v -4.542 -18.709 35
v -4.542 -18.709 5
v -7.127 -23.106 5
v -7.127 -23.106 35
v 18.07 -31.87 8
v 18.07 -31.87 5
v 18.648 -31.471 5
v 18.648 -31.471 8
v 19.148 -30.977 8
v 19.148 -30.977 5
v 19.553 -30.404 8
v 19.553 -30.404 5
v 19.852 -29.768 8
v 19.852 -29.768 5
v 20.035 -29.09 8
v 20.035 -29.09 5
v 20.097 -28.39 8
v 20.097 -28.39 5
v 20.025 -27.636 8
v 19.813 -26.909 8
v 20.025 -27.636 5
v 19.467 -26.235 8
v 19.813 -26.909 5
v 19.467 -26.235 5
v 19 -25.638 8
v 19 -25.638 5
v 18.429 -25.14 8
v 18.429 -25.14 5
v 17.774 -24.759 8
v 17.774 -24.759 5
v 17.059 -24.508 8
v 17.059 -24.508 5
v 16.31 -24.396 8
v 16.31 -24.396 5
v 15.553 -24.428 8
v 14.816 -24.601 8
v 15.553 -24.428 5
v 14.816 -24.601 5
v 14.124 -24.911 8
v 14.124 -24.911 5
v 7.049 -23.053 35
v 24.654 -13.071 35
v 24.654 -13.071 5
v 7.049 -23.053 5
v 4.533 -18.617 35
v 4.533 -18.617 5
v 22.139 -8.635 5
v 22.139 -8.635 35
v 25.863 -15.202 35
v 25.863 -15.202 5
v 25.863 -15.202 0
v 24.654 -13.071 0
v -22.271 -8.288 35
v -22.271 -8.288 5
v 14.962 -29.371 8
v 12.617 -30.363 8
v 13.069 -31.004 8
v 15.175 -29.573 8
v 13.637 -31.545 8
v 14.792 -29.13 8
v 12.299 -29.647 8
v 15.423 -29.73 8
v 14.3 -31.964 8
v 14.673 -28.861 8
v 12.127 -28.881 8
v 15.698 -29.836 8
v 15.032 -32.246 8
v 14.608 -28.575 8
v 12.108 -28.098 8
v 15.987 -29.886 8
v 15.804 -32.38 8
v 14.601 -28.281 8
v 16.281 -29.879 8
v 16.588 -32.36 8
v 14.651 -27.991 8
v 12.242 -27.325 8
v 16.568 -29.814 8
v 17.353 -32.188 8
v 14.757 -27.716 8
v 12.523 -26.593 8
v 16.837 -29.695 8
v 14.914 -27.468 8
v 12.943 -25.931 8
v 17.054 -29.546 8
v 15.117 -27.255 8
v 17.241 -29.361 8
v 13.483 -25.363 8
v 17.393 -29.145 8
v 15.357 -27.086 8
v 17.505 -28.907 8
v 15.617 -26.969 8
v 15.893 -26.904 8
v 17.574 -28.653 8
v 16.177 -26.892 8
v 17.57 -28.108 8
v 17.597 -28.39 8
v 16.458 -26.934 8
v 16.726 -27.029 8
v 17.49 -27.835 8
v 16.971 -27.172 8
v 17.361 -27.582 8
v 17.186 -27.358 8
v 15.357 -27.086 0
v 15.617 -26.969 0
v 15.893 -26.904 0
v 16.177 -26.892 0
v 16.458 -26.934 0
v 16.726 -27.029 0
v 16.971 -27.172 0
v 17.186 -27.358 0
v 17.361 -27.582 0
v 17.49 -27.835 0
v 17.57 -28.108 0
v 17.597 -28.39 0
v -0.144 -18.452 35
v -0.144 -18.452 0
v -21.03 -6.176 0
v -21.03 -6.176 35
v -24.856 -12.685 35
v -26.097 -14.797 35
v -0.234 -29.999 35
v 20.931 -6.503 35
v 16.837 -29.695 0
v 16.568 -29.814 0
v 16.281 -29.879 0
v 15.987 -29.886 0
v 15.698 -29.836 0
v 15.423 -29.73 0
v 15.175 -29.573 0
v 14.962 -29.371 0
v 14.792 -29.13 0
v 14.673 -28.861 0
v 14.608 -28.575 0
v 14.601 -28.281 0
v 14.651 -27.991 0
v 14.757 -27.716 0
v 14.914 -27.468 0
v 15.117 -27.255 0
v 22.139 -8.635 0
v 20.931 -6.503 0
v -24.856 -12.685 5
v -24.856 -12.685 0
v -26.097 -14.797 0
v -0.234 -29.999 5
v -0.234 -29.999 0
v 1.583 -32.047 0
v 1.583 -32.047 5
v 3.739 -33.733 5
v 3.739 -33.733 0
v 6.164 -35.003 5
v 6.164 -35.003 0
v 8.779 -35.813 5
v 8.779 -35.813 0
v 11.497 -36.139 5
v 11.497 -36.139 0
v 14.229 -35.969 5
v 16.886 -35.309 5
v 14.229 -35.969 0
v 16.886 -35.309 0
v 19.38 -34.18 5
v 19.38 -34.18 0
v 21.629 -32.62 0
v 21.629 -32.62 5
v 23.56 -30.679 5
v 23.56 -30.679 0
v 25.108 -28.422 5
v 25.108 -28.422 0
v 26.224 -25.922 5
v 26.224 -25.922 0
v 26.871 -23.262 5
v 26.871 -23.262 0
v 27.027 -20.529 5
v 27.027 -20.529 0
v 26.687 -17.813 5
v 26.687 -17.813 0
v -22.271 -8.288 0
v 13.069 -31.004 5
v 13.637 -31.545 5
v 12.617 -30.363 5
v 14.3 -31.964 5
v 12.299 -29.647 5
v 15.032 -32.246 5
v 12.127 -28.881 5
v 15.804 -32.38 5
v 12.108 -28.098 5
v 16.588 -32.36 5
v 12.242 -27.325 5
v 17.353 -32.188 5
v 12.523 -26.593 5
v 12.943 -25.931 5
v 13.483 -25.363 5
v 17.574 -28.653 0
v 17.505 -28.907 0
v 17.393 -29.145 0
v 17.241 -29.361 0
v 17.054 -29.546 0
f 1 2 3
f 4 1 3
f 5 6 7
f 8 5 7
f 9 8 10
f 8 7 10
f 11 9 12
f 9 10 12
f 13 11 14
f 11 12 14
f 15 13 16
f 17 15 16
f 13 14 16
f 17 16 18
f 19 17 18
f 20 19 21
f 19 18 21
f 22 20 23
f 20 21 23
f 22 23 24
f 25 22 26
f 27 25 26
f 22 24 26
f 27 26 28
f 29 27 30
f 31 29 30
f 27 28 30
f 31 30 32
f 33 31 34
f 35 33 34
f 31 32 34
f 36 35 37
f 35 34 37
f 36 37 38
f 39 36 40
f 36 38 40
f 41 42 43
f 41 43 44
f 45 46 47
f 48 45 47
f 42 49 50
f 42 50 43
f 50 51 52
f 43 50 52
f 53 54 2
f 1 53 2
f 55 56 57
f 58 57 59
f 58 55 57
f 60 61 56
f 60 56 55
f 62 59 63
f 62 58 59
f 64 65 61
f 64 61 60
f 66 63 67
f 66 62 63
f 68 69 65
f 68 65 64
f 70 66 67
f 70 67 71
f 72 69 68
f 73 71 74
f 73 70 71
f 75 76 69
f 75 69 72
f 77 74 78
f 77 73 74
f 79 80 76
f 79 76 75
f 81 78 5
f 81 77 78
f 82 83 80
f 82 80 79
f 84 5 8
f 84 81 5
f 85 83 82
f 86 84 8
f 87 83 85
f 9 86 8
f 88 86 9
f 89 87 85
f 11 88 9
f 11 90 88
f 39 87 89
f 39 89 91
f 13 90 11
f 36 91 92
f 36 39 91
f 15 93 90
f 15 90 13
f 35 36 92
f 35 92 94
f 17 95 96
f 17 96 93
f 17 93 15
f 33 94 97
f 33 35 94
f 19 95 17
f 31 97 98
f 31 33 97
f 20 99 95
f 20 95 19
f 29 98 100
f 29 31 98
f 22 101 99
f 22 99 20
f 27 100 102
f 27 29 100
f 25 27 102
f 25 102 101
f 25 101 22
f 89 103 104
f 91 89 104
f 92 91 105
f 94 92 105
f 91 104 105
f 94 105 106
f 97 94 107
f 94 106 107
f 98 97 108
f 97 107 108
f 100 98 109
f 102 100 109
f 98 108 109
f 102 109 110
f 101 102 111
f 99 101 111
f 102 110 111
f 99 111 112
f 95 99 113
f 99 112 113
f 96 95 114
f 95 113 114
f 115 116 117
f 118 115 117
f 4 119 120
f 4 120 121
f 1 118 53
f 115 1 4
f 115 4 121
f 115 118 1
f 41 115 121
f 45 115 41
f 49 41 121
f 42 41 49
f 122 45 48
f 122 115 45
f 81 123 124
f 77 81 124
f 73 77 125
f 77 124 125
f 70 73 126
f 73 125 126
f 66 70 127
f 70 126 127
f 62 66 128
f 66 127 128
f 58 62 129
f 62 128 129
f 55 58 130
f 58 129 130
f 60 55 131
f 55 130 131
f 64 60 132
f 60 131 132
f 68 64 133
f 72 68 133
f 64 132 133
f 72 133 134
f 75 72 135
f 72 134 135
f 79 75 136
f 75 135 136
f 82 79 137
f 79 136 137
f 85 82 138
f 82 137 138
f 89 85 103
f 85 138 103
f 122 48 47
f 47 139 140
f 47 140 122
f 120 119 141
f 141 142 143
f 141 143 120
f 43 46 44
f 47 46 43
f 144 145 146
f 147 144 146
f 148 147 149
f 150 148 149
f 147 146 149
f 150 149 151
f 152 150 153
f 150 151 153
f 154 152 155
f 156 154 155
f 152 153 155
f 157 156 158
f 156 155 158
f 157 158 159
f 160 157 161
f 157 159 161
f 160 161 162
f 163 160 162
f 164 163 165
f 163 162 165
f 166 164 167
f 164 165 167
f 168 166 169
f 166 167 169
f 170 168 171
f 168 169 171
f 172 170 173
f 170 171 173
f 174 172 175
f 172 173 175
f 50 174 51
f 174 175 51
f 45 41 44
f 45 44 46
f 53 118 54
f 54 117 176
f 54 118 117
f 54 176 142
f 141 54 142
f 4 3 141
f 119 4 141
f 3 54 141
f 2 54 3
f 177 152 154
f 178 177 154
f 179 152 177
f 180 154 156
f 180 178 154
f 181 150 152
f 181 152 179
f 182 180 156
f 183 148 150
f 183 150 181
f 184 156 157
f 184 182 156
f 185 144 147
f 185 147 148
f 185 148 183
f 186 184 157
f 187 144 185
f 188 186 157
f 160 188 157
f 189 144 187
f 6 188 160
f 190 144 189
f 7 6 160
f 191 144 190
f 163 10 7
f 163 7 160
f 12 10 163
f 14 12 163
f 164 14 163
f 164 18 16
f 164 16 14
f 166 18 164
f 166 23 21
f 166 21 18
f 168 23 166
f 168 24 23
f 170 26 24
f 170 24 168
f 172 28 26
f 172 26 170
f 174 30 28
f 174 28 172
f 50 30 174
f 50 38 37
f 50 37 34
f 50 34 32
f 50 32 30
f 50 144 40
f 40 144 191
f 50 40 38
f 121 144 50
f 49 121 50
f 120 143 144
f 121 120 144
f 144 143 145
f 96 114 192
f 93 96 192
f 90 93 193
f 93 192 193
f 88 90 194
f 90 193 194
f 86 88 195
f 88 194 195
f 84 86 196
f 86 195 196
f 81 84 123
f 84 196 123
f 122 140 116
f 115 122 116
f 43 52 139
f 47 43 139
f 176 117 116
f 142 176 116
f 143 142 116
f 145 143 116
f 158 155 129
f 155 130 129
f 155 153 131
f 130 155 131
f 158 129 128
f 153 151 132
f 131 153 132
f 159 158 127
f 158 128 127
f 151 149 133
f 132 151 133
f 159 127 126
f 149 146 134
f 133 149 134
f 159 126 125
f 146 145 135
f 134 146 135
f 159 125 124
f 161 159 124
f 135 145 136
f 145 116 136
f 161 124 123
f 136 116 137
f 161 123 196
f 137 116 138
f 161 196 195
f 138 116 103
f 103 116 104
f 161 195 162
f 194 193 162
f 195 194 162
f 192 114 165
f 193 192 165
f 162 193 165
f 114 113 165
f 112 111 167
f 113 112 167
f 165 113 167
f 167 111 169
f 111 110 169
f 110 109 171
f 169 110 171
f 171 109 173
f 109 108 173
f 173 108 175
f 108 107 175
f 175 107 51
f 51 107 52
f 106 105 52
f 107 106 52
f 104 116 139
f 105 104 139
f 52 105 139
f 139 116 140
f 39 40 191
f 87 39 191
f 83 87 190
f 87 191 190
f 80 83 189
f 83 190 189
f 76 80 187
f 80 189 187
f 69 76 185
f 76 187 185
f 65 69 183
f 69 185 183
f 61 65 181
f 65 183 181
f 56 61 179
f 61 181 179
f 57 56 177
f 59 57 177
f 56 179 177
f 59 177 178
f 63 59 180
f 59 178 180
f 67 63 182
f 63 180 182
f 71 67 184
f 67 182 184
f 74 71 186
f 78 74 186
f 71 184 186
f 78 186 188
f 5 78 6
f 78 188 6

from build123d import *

# Parameters (mm, degrees)
F1_DEPTH = 35
F2_DEPTH = 5
F3_DEPTH = 5
F4_DEPTH = 8


with BuildPart() as f1:
    # F0 (on Top) → F1 (new body)
    with BuildSketch(Plane.XY):
        Polygon((-4.5421427263, -18.7091076313), (-7.1265365105, -23.1058005667), (-0.2120626165, -27.170156121), (7.0488793967, -23.0532723663), (4.5334285141, -18.6167752281), (22.1390458625, -8.6345608102), (20.9306429875, -6.5033023811), (-0.1440209293, -18.4524325843), (-21.0296031968, -6.1758033577), (-22.271125701, -8.28794016), align=None)
        Polygon((-24.8555194852, -12.6846330954), (-26.0970419893, -14.7967698977), (-0.2341423693, -29.9990862753), (12.8143786254, -22.6007013264), (25.8628996201, -15.2023163775), (24.6544967451, -13.0710579484), (7.0488793967, -23.0532723663), (-0.2120626165, -27.170156121), (-7.1265365105, -23.1058005667), align=None)
    extrude(amount=F1_DEPTH)

    # F0 (on Top) → F2 (join)
    with BuildSketch(Plane.XY):
        Polygon((-22.271125701, -8.28794016), (-24.8555194852, -12.6846330954), (-7.1265365105, -23.1058005667), (-4.5421427263, -18.7091076313), align=None)
        Polygon((7.0488793967, -23.0532723663), (24.6544967451, -13.0710579484), (22.1390458625, -8.6345608102), (4.5334285141, -18.6167752281), align=None)
    extrude(amount=F2_DEPTH)

    # F0 (on Top) → F3 (join)
    with BuildSketch(Plane.XY):
        with BuildLine():
            Line((12.8143786254, -22.6007013264), (-0.2341423693, -29.9990862753))
            ThreePointArc((-0.2341423693, -29.9990862753), (8.7789969459, -35.8134839164), (19.3797362449, -34.1800132069))
            Line((19.3797362449, -34.1800132069), (18.0699600882, -31.8699628652))
            ThreePointArc((18.0699600882, -31.8699628652), (12.6174518365, -30.3632599197), (14.1241547821, -24.9107516681))
            Line((14.1241547821, -24.9107516681), (12.8143786254, -22.6007013264))
        make_face()
        with BuildLine():
            Line((25.8628996201, -15.2023163775), (12.8143786254, -22.6007013264))
            Line((12.8143786254, -22.6007013264), (14.1241547821, -24.9107516681))
            ThreePointArc((14.1241547821, -24.9107516681), (18.1105605252, -24.9340868337), (20.0970574351, -28.3903572667))
            ThreePointArc((20.0970574351, -28.3903572667), (19.5533278681, -30.4038603568), (18.0699600882, -31.8699628652))
            Line((18.0699600882, -31.8699628652), (19.3797362449, -34.1800132069))
            ThreePointArc((19.3797362449, -34.1800132069), (26.2244652335, -25.9220724639), (25.8628996201, -15.2023163775))
        make_face()
    extrude(amount=F3_DEPTH)

    # F0 (on Top) → F4 (join)
    with BuildSketch(Plane.XY):
        with BuildLine():
            Line((15.3572189402, -27.0855051672), (14.1241547821, -24.9107516681))
            ThreePointArc((14.1241547821, -24.9107516681), (12.6174518365, -30.3632599197), (18.0699600882, -31.8699628652))
            Line((18.0699600882, -31.8699628652), (16.83689593, -29.6952093661))
            ThreePointArc((16.83689593, -29.6952093661), (14.7922053357, -29.1301957615), (15.3572189402, -27.0855051672))
        make_face()
        with BuildLine():
            ThreePointArc((20.0970574351, -28.3903572667), (18.1105605252, -24.9340868337), (14.1241547821, -24.9107516681))
            Line((14.1241547821, -24.9107516681), (15.3572189402, -27.0855051672))
            ThreePointArc((15.3572189402, -27.0855051672), (16.8521210939, -27.0942558543), (17.5970574351, -28.3903572667))
            ThreePointArc((17.5970574351, -28.3903572667), (17.3931588475, -29.1454209255), (16.83689593, -29.6952093661))
            Line((16.83689593, -29.6952093661), (18.0699600882, -31.8699628652))
            ThreePointArc((18.0699600882, -31.8699628652), (19.5533278681, -30.4038603568), (20.0970574351, -28.3903572667))
        make_face()
    extrude(amount=F4_DEPTH)


solid = f1.part
